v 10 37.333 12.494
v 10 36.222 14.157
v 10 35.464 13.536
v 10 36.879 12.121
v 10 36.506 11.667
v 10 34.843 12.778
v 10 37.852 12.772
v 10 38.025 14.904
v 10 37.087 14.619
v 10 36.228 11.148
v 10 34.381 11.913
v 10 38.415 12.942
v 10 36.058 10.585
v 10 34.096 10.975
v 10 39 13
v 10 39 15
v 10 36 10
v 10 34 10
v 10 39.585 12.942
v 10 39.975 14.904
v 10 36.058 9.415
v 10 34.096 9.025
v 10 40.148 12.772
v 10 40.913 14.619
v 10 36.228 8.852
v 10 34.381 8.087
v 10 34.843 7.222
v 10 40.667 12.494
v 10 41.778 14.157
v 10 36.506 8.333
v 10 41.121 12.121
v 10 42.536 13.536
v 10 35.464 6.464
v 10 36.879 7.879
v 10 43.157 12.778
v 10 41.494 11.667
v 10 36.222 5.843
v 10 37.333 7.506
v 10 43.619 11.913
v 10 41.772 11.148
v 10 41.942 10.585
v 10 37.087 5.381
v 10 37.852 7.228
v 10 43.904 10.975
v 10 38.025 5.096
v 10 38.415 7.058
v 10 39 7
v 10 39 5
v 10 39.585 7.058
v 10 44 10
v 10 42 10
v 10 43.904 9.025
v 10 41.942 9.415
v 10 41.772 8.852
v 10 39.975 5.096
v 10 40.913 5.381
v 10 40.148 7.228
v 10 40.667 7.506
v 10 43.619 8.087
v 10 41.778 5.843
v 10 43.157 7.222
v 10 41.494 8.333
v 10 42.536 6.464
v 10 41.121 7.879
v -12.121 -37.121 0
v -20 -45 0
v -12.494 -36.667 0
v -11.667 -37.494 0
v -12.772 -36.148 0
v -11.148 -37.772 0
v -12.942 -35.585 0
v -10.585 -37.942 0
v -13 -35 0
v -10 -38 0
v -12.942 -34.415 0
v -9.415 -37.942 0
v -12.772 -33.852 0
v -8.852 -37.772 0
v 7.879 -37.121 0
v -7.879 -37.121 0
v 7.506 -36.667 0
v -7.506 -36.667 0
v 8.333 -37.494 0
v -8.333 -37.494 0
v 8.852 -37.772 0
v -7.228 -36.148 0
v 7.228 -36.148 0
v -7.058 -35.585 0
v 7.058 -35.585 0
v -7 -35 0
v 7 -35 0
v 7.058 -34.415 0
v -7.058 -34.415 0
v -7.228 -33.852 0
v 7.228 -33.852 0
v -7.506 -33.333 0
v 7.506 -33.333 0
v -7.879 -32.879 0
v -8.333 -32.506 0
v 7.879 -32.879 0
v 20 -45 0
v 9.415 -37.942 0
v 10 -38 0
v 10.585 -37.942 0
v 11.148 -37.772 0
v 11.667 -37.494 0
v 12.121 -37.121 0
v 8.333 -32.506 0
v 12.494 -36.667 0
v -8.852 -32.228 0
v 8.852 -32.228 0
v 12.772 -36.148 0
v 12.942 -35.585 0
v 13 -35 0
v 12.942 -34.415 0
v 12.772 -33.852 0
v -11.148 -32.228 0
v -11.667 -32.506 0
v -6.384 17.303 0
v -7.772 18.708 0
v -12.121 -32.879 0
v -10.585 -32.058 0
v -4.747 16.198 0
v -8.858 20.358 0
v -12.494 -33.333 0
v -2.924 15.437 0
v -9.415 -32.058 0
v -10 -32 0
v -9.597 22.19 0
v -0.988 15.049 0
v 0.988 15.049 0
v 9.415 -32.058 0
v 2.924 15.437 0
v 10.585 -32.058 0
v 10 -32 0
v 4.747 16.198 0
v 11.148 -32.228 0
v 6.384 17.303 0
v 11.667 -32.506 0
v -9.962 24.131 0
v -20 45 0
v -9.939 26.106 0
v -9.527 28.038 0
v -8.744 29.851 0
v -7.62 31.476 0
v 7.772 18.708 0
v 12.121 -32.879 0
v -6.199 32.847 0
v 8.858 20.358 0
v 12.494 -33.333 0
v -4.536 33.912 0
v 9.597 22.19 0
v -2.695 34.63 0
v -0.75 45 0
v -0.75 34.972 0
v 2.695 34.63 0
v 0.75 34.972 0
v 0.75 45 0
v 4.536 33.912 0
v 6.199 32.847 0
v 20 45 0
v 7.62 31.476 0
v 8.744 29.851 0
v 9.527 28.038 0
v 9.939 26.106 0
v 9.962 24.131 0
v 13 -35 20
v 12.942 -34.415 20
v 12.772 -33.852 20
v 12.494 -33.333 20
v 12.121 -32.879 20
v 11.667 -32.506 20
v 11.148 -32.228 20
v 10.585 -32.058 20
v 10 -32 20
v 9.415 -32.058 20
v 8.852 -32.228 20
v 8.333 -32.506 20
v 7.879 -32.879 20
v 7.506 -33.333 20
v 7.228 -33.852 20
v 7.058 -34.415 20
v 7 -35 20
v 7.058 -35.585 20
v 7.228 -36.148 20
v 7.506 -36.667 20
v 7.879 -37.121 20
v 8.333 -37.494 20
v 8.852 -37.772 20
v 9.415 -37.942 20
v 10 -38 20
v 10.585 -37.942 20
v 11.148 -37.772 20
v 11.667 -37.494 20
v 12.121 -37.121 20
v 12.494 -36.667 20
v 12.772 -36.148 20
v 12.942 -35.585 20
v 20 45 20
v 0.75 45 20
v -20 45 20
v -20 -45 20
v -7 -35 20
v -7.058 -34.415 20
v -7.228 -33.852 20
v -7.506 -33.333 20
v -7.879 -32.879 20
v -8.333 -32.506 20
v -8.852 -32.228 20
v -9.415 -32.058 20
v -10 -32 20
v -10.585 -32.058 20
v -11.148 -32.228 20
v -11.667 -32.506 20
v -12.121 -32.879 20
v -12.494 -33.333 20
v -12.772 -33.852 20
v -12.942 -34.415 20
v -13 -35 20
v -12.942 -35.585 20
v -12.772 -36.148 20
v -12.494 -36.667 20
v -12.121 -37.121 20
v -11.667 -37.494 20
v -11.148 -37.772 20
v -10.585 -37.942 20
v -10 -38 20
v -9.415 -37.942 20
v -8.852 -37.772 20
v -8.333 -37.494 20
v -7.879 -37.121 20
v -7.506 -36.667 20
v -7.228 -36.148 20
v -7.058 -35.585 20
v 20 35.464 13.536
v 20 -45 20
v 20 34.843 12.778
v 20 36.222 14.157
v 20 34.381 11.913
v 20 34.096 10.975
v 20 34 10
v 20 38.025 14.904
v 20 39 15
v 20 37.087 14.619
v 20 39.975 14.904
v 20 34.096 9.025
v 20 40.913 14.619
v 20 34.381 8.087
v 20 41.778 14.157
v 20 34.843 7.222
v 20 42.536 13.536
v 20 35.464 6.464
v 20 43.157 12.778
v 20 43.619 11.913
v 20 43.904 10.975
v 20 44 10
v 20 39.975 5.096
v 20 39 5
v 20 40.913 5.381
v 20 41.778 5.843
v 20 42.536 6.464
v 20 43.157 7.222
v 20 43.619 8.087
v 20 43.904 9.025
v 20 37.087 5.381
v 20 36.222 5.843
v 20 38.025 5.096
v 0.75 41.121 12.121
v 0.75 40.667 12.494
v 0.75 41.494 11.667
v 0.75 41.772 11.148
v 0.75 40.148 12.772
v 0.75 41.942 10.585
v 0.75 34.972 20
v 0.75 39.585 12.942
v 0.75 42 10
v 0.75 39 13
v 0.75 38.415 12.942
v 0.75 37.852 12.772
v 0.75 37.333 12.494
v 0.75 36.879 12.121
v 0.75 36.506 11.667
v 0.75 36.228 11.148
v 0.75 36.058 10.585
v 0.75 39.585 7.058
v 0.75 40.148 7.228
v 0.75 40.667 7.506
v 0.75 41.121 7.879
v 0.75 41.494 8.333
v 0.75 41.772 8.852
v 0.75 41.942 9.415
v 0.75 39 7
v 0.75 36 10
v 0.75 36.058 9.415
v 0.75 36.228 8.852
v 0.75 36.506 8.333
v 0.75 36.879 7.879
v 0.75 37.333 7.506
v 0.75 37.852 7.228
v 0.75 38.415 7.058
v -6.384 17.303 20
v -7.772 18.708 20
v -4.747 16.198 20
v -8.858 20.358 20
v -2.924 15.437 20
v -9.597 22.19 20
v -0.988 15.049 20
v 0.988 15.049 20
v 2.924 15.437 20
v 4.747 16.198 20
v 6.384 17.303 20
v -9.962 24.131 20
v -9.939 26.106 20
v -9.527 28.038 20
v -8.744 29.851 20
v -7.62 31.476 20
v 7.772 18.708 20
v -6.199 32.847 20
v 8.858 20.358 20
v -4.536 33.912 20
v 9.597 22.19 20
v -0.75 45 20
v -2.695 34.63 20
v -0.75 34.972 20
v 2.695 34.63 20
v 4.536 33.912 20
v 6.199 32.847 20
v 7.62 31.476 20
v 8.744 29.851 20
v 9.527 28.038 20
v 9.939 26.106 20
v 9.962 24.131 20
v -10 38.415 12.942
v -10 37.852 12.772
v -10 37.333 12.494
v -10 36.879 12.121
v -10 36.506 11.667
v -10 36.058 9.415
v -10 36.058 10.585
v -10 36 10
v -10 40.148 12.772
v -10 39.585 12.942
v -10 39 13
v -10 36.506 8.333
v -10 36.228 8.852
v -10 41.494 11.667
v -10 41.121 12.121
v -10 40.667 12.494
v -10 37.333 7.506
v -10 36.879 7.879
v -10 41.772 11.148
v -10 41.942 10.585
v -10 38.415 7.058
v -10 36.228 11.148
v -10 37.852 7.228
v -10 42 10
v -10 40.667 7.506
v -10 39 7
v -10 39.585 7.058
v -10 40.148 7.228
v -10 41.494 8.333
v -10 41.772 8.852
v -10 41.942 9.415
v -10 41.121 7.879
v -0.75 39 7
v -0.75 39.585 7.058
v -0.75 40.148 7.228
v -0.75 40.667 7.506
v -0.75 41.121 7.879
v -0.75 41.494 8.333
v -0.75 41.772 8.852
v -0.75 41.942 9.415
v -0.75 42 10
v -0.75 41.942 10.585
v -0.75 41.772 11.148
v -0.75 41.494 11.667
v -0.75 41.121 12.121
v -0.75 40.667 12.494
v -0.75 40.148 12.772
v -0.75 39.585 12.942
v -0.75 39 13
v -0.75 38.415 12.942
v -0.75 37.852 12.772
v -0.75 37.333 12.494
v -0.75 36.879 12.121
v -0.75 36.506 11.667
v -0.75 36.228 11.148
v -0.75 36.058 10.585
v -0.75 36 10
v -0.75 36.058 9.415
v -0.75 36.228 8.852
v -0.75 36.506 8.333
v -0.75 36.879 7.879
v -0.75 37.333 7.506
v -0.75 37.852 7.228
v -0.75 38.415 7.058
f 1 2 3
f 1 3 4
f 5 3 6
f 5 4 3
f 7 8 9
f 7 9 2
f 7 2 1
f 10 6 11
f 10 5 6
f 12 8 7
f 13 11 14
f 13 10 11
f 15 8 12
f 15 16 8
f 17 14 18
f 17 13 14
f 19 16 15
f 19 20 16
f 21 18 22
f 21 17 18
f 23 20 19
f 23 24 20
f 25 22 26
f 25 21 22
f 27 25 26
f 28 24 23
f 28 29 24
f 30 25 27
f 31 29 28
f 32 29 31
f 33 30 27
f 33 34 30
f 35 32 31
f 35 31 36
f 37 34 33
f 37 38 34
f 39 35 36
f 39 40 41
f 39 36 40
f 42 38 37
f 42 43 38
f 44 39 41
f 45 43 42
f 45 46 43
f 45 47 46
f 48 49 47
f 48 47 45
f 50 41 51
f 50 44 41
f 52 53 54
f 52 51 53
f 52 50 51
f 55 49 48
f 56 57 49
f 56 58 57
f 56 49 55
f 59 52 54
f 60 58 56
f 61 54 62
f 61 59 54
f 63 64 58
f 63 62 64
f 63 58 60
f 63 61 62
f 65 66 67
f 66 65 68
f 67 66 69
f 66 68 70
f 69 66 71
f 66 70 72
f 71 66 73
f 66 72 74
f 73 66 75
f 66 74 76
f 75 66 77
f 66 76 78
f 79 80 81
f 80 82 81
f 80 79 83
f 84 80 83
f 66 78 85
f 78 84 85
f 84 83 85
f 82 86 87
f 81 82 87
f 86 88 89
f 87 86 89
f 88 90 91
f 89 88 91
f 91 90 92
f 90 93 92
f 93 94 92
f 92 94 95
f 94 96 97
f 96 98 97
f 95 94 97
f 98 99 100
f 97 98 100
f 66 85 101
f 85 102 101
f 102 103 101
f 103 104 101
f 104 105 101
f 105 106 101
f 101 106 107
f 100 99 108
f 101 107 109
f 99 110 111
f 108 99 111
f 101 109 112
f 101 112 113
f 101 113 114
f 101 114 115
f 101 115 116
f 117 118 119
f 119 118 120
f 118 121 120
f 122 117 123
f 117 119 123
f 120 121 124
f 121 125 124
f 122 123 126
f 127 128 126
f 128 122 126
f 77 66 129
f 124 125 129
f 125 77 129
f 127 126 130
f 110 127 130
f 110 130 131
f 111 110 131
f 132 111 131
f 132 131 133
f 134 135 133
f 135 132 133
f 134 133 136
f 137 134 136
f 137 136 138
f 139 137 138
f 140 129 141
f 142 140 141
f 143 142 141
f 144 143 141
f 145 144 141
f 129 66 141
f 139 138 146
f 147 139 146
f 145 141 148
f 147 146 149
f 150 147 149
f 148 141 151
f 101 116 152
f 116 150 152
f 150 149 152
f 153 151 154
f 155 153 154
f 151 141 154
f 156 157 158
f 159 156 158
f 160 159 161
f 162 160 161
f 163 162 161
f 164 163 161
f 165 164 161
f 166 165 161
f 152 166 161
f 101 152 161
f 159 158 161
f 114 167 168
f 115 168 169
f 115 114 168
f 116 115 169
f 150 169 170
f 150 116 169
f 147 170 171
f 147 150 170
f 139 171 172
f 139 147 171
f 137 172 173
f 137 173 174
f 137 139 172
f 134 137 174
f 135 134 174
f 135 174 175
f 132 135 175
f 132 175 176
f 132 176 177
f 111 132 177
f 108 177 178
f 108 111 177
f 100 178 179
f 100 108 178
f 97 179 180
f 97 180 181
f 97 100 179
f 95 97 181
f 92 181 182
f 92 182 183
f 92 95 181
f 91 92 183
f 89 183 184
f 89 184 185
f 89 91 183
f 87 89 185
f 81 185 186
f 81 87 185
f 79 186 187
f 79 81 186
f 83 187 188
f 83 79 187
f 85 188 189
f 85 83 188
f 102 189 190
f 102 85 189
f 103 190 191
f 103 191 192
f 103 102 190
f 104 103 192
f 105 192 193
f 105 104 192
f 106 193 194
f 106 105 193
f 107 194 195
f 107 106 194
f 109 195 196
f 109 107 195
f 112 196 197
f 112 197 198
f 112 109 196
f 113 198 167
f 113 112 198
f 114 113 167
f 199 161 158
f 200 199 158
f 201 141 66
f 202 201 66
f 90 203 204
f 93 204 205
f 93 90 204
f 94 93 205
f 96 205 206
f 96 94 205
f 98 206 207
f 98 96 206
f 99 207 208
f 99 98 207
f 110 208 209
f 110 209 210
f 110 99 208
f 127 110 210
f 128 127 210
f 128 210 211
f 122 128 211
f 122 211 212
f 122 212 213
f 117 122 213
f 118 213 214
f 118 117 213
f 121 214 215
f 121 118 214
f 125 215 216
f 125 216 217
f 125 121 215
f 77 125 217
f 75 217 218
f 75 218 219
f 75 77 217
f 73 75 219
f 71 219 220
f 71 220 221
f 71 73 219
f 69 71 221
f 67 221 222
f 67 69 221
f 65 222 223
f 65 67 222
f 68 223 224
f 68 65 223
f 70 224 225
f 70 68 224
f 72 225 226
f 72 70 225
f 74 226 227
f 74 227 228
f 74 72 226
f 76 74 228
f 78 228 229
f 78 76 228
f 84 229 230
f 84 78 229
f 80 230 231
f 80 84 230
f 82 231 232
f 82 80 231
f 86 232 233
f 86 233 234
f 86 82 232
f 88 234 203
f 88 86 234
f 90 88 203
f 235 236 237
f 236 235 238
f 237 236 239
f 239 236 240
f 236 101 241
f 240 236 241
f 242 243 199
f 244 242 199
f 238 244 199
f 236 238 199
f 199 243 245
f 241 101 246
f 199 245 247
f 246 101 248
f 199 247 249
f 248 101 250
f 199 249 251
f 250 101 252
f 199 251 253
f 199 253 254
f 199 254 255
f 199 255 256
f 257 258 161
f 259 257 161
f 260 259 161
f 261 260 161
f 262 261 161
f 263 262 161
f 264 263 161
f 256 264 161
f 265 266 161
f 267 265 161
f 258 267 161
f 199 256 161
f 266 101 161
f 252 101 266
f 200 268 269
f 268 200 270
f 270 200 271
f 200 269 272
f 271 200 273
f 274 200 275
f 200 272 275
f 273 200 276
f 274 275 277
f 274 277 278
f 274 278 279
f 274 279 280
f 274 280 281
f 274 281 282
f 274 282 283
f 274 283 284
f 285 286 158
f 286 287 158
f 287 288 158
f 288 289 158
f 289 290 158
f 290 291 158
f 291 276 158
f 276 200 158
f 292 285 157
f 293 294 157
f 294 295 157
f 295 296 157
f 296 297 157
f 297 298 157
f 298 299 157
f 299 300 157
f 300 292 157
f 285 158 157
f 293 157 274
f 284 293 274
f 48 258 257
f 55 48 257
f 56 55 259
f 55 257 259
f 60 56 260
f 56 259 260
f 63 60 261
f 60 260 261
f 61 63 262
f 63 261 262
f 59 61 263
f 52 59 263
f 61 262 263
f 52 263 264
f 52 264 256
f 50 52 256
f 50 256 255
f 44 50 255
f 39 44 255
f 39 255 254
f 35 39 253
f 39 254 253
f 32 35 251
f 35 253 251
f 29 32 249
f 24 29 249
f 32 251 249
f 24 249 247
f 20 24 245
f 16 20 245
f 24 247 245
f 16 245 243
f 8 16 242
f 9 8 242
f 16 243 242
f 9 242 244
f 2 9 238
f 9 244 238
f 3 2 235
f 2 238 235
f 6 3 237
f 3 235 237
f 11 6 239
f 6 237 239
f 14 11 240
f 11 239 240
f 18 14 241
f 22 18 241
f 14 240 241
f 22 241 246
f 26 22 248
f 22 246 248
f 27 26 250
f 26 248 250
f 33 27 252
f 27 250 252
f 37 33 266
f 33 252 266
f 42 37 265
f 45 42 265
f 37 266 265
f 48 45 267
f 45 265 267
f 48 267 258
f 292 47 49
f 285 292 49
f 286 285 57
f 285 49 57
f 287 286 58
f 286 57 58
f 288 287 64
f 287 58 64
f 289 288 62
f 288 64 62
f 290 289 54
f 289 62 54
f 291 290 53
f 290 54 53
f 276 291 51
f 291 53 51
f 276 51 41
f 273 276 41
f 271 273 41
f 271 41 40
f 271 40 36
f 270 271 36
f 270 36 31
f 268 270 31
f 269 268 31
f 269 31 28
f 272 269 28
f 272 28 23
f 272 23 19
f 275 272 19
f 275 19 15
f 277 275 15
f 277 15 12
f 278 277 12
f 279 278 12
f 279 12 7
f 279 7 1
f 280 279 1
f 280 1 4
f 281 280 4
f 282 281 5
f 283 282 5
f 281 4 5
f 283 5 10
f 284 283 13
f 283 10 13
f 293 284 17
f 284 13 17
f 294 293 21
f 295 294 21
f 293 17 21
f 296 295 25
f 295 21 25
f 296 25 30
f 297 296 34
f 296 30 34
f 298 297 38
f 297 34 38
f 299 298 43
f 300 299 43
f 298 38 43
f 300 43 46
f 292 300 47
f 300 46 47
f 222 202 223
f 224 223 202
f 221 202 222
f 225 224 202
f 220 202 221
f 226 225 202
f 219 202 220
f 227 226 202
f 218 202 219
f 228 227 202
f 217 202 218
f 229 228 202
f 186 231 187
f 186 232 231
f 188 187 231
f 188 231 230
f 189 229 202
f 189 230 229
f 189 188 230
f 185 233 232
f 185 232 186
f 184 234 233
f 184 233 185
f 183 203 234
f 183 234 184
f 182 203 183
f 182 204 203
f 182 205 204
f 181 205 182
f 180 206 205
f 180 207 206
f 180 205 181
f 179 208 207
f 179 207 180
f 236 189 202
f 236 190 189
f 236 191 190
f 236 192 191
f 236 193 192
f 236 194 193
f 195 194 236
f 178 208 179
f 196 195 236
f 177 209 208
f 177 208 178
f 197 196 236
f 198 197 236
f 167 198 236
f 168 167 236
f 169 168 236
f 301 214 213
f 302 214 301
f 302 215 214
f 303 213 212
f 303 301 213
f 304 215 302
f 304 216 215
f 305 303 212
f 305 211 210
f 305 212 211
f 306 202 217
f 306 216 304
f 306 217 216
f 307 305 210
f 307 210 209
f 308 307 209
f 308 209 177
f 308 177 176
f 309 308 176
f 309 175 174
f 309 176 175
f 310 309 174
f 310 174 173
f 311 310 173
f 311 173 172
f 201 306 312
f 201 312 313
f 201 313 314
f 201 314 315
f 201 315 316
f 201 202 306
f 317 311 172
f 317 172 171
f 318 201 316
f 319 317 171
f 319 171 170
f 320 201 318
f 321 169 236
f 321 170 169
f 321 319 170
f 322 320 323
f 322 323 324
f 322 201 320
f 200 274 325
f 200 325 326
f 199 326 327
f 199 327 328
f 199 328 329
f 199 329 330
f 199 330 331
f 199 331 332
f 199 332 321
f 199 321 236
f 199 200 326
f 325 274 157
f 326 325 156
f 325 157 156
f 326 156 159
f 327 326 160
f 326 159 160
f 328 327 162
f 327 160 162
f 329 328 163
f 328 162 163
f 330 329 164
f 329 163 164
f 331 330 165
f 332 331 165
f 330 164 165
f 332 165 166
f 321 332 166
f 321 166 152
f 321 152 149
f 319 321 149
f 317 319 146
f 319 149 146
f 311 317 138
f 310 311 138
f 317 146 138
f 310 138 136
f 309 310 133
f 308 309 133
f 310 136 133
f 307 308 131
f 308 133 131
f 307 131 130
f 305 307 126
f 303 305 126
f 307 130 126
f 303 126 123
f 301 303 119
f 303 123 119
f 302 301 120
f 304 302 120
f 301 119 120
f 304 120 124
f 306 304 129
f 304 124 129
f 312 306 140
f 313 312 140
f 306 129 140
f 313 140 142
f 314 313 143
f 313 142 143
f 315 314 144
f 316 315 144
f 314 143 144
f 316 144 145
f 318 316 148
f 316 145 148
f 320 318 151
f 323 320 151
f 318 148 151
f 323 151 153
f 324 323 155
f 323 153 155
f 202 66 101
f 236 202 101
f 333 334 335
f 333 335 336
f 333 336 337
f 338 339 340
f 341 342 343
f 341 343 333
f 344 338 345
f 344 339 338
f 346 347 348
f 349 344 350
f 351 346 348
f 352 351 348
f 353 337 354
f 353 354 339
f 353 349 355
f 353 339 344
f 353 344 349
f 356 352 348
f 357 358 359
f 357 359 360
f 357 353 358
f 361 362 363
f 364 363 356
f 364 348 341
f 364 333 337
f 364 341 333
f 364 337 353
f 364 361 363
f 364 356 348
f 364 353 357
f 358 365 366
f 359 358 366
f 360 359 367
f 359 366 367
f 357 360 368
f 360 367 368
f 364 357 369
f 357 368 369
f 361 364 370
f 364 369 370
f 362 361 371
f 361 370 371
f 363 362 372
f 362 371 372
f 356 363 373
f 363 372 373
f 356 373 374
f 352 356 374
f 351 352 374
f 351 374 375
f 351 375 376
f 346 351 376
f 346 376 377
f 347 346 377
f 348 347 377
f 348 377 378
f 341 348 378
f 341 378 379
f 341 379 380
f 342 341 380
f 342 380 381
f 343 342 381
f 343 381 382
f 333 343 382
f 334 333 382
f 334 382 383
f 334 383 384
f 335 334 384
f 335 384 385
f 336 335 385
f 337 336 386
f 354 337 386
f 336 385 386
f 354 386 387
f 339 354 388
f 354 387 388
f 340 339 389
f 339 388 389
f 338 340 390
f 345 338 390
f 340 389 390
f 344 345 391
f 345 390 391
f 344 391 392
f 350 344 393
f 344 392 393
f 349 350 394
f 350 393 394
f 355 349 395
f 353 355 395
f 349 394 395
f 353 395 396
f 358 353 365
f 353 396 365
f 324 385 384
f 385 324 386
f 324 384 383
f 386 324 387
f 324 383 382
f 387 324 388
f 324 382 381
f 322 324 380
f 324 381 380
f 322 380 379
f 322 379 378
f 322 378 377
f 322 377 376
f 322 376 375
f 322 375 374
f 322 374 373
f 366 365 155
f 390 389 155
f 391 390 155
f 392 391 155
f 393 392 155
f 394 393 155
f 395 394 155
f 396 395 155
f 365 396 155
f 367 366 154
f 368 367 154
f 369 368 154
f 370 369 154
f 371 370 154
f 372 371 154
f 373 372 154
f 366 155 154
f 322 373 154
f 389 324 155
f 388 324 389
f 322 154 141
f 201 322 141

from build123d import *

# Parameters (mm, degrees)
CROQUIS1_R              = 3
SALIENTE_EXTRUIR1_DEPTH = 20
CROQUIS2_R              = 3
CORTAR_EXTRUIR1_DEPTH   = 30
CROQUIS3_R              = 5
CORTAR_EXTRUIR2_DEPTH   = 10


with BuildPart() as part:
    # Croquis1 → Saliente-Extruir1 (new body)
    with BuildSketch(Plane.XY):
        with BuildLine():
            Line((-0.75, 34.971835338), (-0.75, 45))
            Line((-0.75, 45), (-20, 45))
            Line((-20, 45), (-20, -45))
            Line((-20, -45), (20, -45))
            Line((20, -45), (20, 45))
            Line((20, 45), (0.75, 45))
            Line((0.75, 45), (0.75, 34.971835338))
            ThreePointArc((0.75, 34.971835338), (0, 15), (-0.75, 34.971835338))
        make_face()
        with Locations((-10, -35)):
            Circle(CROQUIS1_R, mode=Mode.SUBTRACT)
        with Locations((10, -35)):
            Circle(CROQUIS1_R, mode=Mode.SUBTRACT)
    extrude(amount=SALIENTE_EXTRUIR1_DEPTH)

    # Croquis2 → Cortar-Extruir1 (cut)
    with BuildSketch(Plane(origin=(20, 0, 0), x_dir=(0, 0, -1), z_dir=(1, 0, 0))):
        with Locations((-10, 39)):
            Circle(CROQUIS2_R)
    extrude(amount=-CORTAR_EXTRUIR1_DEPTH, mode=Mode.SUBTRACT)

    # Croquis3 → Cortar-Extruir2 (cut)
    with BuildSketch(Plane(origin=(20, 0, 0), x_dir=(0, 0, -1), z_dir=(1, 0, 0))):
        with Locations((-10, 39)):
            Circle(CROQUIS3_R)
    extrude(amount=-CORTAR_EXTRUIR2_DEPTH, mode=Mode.SUBTRACT)


solid = part.part
